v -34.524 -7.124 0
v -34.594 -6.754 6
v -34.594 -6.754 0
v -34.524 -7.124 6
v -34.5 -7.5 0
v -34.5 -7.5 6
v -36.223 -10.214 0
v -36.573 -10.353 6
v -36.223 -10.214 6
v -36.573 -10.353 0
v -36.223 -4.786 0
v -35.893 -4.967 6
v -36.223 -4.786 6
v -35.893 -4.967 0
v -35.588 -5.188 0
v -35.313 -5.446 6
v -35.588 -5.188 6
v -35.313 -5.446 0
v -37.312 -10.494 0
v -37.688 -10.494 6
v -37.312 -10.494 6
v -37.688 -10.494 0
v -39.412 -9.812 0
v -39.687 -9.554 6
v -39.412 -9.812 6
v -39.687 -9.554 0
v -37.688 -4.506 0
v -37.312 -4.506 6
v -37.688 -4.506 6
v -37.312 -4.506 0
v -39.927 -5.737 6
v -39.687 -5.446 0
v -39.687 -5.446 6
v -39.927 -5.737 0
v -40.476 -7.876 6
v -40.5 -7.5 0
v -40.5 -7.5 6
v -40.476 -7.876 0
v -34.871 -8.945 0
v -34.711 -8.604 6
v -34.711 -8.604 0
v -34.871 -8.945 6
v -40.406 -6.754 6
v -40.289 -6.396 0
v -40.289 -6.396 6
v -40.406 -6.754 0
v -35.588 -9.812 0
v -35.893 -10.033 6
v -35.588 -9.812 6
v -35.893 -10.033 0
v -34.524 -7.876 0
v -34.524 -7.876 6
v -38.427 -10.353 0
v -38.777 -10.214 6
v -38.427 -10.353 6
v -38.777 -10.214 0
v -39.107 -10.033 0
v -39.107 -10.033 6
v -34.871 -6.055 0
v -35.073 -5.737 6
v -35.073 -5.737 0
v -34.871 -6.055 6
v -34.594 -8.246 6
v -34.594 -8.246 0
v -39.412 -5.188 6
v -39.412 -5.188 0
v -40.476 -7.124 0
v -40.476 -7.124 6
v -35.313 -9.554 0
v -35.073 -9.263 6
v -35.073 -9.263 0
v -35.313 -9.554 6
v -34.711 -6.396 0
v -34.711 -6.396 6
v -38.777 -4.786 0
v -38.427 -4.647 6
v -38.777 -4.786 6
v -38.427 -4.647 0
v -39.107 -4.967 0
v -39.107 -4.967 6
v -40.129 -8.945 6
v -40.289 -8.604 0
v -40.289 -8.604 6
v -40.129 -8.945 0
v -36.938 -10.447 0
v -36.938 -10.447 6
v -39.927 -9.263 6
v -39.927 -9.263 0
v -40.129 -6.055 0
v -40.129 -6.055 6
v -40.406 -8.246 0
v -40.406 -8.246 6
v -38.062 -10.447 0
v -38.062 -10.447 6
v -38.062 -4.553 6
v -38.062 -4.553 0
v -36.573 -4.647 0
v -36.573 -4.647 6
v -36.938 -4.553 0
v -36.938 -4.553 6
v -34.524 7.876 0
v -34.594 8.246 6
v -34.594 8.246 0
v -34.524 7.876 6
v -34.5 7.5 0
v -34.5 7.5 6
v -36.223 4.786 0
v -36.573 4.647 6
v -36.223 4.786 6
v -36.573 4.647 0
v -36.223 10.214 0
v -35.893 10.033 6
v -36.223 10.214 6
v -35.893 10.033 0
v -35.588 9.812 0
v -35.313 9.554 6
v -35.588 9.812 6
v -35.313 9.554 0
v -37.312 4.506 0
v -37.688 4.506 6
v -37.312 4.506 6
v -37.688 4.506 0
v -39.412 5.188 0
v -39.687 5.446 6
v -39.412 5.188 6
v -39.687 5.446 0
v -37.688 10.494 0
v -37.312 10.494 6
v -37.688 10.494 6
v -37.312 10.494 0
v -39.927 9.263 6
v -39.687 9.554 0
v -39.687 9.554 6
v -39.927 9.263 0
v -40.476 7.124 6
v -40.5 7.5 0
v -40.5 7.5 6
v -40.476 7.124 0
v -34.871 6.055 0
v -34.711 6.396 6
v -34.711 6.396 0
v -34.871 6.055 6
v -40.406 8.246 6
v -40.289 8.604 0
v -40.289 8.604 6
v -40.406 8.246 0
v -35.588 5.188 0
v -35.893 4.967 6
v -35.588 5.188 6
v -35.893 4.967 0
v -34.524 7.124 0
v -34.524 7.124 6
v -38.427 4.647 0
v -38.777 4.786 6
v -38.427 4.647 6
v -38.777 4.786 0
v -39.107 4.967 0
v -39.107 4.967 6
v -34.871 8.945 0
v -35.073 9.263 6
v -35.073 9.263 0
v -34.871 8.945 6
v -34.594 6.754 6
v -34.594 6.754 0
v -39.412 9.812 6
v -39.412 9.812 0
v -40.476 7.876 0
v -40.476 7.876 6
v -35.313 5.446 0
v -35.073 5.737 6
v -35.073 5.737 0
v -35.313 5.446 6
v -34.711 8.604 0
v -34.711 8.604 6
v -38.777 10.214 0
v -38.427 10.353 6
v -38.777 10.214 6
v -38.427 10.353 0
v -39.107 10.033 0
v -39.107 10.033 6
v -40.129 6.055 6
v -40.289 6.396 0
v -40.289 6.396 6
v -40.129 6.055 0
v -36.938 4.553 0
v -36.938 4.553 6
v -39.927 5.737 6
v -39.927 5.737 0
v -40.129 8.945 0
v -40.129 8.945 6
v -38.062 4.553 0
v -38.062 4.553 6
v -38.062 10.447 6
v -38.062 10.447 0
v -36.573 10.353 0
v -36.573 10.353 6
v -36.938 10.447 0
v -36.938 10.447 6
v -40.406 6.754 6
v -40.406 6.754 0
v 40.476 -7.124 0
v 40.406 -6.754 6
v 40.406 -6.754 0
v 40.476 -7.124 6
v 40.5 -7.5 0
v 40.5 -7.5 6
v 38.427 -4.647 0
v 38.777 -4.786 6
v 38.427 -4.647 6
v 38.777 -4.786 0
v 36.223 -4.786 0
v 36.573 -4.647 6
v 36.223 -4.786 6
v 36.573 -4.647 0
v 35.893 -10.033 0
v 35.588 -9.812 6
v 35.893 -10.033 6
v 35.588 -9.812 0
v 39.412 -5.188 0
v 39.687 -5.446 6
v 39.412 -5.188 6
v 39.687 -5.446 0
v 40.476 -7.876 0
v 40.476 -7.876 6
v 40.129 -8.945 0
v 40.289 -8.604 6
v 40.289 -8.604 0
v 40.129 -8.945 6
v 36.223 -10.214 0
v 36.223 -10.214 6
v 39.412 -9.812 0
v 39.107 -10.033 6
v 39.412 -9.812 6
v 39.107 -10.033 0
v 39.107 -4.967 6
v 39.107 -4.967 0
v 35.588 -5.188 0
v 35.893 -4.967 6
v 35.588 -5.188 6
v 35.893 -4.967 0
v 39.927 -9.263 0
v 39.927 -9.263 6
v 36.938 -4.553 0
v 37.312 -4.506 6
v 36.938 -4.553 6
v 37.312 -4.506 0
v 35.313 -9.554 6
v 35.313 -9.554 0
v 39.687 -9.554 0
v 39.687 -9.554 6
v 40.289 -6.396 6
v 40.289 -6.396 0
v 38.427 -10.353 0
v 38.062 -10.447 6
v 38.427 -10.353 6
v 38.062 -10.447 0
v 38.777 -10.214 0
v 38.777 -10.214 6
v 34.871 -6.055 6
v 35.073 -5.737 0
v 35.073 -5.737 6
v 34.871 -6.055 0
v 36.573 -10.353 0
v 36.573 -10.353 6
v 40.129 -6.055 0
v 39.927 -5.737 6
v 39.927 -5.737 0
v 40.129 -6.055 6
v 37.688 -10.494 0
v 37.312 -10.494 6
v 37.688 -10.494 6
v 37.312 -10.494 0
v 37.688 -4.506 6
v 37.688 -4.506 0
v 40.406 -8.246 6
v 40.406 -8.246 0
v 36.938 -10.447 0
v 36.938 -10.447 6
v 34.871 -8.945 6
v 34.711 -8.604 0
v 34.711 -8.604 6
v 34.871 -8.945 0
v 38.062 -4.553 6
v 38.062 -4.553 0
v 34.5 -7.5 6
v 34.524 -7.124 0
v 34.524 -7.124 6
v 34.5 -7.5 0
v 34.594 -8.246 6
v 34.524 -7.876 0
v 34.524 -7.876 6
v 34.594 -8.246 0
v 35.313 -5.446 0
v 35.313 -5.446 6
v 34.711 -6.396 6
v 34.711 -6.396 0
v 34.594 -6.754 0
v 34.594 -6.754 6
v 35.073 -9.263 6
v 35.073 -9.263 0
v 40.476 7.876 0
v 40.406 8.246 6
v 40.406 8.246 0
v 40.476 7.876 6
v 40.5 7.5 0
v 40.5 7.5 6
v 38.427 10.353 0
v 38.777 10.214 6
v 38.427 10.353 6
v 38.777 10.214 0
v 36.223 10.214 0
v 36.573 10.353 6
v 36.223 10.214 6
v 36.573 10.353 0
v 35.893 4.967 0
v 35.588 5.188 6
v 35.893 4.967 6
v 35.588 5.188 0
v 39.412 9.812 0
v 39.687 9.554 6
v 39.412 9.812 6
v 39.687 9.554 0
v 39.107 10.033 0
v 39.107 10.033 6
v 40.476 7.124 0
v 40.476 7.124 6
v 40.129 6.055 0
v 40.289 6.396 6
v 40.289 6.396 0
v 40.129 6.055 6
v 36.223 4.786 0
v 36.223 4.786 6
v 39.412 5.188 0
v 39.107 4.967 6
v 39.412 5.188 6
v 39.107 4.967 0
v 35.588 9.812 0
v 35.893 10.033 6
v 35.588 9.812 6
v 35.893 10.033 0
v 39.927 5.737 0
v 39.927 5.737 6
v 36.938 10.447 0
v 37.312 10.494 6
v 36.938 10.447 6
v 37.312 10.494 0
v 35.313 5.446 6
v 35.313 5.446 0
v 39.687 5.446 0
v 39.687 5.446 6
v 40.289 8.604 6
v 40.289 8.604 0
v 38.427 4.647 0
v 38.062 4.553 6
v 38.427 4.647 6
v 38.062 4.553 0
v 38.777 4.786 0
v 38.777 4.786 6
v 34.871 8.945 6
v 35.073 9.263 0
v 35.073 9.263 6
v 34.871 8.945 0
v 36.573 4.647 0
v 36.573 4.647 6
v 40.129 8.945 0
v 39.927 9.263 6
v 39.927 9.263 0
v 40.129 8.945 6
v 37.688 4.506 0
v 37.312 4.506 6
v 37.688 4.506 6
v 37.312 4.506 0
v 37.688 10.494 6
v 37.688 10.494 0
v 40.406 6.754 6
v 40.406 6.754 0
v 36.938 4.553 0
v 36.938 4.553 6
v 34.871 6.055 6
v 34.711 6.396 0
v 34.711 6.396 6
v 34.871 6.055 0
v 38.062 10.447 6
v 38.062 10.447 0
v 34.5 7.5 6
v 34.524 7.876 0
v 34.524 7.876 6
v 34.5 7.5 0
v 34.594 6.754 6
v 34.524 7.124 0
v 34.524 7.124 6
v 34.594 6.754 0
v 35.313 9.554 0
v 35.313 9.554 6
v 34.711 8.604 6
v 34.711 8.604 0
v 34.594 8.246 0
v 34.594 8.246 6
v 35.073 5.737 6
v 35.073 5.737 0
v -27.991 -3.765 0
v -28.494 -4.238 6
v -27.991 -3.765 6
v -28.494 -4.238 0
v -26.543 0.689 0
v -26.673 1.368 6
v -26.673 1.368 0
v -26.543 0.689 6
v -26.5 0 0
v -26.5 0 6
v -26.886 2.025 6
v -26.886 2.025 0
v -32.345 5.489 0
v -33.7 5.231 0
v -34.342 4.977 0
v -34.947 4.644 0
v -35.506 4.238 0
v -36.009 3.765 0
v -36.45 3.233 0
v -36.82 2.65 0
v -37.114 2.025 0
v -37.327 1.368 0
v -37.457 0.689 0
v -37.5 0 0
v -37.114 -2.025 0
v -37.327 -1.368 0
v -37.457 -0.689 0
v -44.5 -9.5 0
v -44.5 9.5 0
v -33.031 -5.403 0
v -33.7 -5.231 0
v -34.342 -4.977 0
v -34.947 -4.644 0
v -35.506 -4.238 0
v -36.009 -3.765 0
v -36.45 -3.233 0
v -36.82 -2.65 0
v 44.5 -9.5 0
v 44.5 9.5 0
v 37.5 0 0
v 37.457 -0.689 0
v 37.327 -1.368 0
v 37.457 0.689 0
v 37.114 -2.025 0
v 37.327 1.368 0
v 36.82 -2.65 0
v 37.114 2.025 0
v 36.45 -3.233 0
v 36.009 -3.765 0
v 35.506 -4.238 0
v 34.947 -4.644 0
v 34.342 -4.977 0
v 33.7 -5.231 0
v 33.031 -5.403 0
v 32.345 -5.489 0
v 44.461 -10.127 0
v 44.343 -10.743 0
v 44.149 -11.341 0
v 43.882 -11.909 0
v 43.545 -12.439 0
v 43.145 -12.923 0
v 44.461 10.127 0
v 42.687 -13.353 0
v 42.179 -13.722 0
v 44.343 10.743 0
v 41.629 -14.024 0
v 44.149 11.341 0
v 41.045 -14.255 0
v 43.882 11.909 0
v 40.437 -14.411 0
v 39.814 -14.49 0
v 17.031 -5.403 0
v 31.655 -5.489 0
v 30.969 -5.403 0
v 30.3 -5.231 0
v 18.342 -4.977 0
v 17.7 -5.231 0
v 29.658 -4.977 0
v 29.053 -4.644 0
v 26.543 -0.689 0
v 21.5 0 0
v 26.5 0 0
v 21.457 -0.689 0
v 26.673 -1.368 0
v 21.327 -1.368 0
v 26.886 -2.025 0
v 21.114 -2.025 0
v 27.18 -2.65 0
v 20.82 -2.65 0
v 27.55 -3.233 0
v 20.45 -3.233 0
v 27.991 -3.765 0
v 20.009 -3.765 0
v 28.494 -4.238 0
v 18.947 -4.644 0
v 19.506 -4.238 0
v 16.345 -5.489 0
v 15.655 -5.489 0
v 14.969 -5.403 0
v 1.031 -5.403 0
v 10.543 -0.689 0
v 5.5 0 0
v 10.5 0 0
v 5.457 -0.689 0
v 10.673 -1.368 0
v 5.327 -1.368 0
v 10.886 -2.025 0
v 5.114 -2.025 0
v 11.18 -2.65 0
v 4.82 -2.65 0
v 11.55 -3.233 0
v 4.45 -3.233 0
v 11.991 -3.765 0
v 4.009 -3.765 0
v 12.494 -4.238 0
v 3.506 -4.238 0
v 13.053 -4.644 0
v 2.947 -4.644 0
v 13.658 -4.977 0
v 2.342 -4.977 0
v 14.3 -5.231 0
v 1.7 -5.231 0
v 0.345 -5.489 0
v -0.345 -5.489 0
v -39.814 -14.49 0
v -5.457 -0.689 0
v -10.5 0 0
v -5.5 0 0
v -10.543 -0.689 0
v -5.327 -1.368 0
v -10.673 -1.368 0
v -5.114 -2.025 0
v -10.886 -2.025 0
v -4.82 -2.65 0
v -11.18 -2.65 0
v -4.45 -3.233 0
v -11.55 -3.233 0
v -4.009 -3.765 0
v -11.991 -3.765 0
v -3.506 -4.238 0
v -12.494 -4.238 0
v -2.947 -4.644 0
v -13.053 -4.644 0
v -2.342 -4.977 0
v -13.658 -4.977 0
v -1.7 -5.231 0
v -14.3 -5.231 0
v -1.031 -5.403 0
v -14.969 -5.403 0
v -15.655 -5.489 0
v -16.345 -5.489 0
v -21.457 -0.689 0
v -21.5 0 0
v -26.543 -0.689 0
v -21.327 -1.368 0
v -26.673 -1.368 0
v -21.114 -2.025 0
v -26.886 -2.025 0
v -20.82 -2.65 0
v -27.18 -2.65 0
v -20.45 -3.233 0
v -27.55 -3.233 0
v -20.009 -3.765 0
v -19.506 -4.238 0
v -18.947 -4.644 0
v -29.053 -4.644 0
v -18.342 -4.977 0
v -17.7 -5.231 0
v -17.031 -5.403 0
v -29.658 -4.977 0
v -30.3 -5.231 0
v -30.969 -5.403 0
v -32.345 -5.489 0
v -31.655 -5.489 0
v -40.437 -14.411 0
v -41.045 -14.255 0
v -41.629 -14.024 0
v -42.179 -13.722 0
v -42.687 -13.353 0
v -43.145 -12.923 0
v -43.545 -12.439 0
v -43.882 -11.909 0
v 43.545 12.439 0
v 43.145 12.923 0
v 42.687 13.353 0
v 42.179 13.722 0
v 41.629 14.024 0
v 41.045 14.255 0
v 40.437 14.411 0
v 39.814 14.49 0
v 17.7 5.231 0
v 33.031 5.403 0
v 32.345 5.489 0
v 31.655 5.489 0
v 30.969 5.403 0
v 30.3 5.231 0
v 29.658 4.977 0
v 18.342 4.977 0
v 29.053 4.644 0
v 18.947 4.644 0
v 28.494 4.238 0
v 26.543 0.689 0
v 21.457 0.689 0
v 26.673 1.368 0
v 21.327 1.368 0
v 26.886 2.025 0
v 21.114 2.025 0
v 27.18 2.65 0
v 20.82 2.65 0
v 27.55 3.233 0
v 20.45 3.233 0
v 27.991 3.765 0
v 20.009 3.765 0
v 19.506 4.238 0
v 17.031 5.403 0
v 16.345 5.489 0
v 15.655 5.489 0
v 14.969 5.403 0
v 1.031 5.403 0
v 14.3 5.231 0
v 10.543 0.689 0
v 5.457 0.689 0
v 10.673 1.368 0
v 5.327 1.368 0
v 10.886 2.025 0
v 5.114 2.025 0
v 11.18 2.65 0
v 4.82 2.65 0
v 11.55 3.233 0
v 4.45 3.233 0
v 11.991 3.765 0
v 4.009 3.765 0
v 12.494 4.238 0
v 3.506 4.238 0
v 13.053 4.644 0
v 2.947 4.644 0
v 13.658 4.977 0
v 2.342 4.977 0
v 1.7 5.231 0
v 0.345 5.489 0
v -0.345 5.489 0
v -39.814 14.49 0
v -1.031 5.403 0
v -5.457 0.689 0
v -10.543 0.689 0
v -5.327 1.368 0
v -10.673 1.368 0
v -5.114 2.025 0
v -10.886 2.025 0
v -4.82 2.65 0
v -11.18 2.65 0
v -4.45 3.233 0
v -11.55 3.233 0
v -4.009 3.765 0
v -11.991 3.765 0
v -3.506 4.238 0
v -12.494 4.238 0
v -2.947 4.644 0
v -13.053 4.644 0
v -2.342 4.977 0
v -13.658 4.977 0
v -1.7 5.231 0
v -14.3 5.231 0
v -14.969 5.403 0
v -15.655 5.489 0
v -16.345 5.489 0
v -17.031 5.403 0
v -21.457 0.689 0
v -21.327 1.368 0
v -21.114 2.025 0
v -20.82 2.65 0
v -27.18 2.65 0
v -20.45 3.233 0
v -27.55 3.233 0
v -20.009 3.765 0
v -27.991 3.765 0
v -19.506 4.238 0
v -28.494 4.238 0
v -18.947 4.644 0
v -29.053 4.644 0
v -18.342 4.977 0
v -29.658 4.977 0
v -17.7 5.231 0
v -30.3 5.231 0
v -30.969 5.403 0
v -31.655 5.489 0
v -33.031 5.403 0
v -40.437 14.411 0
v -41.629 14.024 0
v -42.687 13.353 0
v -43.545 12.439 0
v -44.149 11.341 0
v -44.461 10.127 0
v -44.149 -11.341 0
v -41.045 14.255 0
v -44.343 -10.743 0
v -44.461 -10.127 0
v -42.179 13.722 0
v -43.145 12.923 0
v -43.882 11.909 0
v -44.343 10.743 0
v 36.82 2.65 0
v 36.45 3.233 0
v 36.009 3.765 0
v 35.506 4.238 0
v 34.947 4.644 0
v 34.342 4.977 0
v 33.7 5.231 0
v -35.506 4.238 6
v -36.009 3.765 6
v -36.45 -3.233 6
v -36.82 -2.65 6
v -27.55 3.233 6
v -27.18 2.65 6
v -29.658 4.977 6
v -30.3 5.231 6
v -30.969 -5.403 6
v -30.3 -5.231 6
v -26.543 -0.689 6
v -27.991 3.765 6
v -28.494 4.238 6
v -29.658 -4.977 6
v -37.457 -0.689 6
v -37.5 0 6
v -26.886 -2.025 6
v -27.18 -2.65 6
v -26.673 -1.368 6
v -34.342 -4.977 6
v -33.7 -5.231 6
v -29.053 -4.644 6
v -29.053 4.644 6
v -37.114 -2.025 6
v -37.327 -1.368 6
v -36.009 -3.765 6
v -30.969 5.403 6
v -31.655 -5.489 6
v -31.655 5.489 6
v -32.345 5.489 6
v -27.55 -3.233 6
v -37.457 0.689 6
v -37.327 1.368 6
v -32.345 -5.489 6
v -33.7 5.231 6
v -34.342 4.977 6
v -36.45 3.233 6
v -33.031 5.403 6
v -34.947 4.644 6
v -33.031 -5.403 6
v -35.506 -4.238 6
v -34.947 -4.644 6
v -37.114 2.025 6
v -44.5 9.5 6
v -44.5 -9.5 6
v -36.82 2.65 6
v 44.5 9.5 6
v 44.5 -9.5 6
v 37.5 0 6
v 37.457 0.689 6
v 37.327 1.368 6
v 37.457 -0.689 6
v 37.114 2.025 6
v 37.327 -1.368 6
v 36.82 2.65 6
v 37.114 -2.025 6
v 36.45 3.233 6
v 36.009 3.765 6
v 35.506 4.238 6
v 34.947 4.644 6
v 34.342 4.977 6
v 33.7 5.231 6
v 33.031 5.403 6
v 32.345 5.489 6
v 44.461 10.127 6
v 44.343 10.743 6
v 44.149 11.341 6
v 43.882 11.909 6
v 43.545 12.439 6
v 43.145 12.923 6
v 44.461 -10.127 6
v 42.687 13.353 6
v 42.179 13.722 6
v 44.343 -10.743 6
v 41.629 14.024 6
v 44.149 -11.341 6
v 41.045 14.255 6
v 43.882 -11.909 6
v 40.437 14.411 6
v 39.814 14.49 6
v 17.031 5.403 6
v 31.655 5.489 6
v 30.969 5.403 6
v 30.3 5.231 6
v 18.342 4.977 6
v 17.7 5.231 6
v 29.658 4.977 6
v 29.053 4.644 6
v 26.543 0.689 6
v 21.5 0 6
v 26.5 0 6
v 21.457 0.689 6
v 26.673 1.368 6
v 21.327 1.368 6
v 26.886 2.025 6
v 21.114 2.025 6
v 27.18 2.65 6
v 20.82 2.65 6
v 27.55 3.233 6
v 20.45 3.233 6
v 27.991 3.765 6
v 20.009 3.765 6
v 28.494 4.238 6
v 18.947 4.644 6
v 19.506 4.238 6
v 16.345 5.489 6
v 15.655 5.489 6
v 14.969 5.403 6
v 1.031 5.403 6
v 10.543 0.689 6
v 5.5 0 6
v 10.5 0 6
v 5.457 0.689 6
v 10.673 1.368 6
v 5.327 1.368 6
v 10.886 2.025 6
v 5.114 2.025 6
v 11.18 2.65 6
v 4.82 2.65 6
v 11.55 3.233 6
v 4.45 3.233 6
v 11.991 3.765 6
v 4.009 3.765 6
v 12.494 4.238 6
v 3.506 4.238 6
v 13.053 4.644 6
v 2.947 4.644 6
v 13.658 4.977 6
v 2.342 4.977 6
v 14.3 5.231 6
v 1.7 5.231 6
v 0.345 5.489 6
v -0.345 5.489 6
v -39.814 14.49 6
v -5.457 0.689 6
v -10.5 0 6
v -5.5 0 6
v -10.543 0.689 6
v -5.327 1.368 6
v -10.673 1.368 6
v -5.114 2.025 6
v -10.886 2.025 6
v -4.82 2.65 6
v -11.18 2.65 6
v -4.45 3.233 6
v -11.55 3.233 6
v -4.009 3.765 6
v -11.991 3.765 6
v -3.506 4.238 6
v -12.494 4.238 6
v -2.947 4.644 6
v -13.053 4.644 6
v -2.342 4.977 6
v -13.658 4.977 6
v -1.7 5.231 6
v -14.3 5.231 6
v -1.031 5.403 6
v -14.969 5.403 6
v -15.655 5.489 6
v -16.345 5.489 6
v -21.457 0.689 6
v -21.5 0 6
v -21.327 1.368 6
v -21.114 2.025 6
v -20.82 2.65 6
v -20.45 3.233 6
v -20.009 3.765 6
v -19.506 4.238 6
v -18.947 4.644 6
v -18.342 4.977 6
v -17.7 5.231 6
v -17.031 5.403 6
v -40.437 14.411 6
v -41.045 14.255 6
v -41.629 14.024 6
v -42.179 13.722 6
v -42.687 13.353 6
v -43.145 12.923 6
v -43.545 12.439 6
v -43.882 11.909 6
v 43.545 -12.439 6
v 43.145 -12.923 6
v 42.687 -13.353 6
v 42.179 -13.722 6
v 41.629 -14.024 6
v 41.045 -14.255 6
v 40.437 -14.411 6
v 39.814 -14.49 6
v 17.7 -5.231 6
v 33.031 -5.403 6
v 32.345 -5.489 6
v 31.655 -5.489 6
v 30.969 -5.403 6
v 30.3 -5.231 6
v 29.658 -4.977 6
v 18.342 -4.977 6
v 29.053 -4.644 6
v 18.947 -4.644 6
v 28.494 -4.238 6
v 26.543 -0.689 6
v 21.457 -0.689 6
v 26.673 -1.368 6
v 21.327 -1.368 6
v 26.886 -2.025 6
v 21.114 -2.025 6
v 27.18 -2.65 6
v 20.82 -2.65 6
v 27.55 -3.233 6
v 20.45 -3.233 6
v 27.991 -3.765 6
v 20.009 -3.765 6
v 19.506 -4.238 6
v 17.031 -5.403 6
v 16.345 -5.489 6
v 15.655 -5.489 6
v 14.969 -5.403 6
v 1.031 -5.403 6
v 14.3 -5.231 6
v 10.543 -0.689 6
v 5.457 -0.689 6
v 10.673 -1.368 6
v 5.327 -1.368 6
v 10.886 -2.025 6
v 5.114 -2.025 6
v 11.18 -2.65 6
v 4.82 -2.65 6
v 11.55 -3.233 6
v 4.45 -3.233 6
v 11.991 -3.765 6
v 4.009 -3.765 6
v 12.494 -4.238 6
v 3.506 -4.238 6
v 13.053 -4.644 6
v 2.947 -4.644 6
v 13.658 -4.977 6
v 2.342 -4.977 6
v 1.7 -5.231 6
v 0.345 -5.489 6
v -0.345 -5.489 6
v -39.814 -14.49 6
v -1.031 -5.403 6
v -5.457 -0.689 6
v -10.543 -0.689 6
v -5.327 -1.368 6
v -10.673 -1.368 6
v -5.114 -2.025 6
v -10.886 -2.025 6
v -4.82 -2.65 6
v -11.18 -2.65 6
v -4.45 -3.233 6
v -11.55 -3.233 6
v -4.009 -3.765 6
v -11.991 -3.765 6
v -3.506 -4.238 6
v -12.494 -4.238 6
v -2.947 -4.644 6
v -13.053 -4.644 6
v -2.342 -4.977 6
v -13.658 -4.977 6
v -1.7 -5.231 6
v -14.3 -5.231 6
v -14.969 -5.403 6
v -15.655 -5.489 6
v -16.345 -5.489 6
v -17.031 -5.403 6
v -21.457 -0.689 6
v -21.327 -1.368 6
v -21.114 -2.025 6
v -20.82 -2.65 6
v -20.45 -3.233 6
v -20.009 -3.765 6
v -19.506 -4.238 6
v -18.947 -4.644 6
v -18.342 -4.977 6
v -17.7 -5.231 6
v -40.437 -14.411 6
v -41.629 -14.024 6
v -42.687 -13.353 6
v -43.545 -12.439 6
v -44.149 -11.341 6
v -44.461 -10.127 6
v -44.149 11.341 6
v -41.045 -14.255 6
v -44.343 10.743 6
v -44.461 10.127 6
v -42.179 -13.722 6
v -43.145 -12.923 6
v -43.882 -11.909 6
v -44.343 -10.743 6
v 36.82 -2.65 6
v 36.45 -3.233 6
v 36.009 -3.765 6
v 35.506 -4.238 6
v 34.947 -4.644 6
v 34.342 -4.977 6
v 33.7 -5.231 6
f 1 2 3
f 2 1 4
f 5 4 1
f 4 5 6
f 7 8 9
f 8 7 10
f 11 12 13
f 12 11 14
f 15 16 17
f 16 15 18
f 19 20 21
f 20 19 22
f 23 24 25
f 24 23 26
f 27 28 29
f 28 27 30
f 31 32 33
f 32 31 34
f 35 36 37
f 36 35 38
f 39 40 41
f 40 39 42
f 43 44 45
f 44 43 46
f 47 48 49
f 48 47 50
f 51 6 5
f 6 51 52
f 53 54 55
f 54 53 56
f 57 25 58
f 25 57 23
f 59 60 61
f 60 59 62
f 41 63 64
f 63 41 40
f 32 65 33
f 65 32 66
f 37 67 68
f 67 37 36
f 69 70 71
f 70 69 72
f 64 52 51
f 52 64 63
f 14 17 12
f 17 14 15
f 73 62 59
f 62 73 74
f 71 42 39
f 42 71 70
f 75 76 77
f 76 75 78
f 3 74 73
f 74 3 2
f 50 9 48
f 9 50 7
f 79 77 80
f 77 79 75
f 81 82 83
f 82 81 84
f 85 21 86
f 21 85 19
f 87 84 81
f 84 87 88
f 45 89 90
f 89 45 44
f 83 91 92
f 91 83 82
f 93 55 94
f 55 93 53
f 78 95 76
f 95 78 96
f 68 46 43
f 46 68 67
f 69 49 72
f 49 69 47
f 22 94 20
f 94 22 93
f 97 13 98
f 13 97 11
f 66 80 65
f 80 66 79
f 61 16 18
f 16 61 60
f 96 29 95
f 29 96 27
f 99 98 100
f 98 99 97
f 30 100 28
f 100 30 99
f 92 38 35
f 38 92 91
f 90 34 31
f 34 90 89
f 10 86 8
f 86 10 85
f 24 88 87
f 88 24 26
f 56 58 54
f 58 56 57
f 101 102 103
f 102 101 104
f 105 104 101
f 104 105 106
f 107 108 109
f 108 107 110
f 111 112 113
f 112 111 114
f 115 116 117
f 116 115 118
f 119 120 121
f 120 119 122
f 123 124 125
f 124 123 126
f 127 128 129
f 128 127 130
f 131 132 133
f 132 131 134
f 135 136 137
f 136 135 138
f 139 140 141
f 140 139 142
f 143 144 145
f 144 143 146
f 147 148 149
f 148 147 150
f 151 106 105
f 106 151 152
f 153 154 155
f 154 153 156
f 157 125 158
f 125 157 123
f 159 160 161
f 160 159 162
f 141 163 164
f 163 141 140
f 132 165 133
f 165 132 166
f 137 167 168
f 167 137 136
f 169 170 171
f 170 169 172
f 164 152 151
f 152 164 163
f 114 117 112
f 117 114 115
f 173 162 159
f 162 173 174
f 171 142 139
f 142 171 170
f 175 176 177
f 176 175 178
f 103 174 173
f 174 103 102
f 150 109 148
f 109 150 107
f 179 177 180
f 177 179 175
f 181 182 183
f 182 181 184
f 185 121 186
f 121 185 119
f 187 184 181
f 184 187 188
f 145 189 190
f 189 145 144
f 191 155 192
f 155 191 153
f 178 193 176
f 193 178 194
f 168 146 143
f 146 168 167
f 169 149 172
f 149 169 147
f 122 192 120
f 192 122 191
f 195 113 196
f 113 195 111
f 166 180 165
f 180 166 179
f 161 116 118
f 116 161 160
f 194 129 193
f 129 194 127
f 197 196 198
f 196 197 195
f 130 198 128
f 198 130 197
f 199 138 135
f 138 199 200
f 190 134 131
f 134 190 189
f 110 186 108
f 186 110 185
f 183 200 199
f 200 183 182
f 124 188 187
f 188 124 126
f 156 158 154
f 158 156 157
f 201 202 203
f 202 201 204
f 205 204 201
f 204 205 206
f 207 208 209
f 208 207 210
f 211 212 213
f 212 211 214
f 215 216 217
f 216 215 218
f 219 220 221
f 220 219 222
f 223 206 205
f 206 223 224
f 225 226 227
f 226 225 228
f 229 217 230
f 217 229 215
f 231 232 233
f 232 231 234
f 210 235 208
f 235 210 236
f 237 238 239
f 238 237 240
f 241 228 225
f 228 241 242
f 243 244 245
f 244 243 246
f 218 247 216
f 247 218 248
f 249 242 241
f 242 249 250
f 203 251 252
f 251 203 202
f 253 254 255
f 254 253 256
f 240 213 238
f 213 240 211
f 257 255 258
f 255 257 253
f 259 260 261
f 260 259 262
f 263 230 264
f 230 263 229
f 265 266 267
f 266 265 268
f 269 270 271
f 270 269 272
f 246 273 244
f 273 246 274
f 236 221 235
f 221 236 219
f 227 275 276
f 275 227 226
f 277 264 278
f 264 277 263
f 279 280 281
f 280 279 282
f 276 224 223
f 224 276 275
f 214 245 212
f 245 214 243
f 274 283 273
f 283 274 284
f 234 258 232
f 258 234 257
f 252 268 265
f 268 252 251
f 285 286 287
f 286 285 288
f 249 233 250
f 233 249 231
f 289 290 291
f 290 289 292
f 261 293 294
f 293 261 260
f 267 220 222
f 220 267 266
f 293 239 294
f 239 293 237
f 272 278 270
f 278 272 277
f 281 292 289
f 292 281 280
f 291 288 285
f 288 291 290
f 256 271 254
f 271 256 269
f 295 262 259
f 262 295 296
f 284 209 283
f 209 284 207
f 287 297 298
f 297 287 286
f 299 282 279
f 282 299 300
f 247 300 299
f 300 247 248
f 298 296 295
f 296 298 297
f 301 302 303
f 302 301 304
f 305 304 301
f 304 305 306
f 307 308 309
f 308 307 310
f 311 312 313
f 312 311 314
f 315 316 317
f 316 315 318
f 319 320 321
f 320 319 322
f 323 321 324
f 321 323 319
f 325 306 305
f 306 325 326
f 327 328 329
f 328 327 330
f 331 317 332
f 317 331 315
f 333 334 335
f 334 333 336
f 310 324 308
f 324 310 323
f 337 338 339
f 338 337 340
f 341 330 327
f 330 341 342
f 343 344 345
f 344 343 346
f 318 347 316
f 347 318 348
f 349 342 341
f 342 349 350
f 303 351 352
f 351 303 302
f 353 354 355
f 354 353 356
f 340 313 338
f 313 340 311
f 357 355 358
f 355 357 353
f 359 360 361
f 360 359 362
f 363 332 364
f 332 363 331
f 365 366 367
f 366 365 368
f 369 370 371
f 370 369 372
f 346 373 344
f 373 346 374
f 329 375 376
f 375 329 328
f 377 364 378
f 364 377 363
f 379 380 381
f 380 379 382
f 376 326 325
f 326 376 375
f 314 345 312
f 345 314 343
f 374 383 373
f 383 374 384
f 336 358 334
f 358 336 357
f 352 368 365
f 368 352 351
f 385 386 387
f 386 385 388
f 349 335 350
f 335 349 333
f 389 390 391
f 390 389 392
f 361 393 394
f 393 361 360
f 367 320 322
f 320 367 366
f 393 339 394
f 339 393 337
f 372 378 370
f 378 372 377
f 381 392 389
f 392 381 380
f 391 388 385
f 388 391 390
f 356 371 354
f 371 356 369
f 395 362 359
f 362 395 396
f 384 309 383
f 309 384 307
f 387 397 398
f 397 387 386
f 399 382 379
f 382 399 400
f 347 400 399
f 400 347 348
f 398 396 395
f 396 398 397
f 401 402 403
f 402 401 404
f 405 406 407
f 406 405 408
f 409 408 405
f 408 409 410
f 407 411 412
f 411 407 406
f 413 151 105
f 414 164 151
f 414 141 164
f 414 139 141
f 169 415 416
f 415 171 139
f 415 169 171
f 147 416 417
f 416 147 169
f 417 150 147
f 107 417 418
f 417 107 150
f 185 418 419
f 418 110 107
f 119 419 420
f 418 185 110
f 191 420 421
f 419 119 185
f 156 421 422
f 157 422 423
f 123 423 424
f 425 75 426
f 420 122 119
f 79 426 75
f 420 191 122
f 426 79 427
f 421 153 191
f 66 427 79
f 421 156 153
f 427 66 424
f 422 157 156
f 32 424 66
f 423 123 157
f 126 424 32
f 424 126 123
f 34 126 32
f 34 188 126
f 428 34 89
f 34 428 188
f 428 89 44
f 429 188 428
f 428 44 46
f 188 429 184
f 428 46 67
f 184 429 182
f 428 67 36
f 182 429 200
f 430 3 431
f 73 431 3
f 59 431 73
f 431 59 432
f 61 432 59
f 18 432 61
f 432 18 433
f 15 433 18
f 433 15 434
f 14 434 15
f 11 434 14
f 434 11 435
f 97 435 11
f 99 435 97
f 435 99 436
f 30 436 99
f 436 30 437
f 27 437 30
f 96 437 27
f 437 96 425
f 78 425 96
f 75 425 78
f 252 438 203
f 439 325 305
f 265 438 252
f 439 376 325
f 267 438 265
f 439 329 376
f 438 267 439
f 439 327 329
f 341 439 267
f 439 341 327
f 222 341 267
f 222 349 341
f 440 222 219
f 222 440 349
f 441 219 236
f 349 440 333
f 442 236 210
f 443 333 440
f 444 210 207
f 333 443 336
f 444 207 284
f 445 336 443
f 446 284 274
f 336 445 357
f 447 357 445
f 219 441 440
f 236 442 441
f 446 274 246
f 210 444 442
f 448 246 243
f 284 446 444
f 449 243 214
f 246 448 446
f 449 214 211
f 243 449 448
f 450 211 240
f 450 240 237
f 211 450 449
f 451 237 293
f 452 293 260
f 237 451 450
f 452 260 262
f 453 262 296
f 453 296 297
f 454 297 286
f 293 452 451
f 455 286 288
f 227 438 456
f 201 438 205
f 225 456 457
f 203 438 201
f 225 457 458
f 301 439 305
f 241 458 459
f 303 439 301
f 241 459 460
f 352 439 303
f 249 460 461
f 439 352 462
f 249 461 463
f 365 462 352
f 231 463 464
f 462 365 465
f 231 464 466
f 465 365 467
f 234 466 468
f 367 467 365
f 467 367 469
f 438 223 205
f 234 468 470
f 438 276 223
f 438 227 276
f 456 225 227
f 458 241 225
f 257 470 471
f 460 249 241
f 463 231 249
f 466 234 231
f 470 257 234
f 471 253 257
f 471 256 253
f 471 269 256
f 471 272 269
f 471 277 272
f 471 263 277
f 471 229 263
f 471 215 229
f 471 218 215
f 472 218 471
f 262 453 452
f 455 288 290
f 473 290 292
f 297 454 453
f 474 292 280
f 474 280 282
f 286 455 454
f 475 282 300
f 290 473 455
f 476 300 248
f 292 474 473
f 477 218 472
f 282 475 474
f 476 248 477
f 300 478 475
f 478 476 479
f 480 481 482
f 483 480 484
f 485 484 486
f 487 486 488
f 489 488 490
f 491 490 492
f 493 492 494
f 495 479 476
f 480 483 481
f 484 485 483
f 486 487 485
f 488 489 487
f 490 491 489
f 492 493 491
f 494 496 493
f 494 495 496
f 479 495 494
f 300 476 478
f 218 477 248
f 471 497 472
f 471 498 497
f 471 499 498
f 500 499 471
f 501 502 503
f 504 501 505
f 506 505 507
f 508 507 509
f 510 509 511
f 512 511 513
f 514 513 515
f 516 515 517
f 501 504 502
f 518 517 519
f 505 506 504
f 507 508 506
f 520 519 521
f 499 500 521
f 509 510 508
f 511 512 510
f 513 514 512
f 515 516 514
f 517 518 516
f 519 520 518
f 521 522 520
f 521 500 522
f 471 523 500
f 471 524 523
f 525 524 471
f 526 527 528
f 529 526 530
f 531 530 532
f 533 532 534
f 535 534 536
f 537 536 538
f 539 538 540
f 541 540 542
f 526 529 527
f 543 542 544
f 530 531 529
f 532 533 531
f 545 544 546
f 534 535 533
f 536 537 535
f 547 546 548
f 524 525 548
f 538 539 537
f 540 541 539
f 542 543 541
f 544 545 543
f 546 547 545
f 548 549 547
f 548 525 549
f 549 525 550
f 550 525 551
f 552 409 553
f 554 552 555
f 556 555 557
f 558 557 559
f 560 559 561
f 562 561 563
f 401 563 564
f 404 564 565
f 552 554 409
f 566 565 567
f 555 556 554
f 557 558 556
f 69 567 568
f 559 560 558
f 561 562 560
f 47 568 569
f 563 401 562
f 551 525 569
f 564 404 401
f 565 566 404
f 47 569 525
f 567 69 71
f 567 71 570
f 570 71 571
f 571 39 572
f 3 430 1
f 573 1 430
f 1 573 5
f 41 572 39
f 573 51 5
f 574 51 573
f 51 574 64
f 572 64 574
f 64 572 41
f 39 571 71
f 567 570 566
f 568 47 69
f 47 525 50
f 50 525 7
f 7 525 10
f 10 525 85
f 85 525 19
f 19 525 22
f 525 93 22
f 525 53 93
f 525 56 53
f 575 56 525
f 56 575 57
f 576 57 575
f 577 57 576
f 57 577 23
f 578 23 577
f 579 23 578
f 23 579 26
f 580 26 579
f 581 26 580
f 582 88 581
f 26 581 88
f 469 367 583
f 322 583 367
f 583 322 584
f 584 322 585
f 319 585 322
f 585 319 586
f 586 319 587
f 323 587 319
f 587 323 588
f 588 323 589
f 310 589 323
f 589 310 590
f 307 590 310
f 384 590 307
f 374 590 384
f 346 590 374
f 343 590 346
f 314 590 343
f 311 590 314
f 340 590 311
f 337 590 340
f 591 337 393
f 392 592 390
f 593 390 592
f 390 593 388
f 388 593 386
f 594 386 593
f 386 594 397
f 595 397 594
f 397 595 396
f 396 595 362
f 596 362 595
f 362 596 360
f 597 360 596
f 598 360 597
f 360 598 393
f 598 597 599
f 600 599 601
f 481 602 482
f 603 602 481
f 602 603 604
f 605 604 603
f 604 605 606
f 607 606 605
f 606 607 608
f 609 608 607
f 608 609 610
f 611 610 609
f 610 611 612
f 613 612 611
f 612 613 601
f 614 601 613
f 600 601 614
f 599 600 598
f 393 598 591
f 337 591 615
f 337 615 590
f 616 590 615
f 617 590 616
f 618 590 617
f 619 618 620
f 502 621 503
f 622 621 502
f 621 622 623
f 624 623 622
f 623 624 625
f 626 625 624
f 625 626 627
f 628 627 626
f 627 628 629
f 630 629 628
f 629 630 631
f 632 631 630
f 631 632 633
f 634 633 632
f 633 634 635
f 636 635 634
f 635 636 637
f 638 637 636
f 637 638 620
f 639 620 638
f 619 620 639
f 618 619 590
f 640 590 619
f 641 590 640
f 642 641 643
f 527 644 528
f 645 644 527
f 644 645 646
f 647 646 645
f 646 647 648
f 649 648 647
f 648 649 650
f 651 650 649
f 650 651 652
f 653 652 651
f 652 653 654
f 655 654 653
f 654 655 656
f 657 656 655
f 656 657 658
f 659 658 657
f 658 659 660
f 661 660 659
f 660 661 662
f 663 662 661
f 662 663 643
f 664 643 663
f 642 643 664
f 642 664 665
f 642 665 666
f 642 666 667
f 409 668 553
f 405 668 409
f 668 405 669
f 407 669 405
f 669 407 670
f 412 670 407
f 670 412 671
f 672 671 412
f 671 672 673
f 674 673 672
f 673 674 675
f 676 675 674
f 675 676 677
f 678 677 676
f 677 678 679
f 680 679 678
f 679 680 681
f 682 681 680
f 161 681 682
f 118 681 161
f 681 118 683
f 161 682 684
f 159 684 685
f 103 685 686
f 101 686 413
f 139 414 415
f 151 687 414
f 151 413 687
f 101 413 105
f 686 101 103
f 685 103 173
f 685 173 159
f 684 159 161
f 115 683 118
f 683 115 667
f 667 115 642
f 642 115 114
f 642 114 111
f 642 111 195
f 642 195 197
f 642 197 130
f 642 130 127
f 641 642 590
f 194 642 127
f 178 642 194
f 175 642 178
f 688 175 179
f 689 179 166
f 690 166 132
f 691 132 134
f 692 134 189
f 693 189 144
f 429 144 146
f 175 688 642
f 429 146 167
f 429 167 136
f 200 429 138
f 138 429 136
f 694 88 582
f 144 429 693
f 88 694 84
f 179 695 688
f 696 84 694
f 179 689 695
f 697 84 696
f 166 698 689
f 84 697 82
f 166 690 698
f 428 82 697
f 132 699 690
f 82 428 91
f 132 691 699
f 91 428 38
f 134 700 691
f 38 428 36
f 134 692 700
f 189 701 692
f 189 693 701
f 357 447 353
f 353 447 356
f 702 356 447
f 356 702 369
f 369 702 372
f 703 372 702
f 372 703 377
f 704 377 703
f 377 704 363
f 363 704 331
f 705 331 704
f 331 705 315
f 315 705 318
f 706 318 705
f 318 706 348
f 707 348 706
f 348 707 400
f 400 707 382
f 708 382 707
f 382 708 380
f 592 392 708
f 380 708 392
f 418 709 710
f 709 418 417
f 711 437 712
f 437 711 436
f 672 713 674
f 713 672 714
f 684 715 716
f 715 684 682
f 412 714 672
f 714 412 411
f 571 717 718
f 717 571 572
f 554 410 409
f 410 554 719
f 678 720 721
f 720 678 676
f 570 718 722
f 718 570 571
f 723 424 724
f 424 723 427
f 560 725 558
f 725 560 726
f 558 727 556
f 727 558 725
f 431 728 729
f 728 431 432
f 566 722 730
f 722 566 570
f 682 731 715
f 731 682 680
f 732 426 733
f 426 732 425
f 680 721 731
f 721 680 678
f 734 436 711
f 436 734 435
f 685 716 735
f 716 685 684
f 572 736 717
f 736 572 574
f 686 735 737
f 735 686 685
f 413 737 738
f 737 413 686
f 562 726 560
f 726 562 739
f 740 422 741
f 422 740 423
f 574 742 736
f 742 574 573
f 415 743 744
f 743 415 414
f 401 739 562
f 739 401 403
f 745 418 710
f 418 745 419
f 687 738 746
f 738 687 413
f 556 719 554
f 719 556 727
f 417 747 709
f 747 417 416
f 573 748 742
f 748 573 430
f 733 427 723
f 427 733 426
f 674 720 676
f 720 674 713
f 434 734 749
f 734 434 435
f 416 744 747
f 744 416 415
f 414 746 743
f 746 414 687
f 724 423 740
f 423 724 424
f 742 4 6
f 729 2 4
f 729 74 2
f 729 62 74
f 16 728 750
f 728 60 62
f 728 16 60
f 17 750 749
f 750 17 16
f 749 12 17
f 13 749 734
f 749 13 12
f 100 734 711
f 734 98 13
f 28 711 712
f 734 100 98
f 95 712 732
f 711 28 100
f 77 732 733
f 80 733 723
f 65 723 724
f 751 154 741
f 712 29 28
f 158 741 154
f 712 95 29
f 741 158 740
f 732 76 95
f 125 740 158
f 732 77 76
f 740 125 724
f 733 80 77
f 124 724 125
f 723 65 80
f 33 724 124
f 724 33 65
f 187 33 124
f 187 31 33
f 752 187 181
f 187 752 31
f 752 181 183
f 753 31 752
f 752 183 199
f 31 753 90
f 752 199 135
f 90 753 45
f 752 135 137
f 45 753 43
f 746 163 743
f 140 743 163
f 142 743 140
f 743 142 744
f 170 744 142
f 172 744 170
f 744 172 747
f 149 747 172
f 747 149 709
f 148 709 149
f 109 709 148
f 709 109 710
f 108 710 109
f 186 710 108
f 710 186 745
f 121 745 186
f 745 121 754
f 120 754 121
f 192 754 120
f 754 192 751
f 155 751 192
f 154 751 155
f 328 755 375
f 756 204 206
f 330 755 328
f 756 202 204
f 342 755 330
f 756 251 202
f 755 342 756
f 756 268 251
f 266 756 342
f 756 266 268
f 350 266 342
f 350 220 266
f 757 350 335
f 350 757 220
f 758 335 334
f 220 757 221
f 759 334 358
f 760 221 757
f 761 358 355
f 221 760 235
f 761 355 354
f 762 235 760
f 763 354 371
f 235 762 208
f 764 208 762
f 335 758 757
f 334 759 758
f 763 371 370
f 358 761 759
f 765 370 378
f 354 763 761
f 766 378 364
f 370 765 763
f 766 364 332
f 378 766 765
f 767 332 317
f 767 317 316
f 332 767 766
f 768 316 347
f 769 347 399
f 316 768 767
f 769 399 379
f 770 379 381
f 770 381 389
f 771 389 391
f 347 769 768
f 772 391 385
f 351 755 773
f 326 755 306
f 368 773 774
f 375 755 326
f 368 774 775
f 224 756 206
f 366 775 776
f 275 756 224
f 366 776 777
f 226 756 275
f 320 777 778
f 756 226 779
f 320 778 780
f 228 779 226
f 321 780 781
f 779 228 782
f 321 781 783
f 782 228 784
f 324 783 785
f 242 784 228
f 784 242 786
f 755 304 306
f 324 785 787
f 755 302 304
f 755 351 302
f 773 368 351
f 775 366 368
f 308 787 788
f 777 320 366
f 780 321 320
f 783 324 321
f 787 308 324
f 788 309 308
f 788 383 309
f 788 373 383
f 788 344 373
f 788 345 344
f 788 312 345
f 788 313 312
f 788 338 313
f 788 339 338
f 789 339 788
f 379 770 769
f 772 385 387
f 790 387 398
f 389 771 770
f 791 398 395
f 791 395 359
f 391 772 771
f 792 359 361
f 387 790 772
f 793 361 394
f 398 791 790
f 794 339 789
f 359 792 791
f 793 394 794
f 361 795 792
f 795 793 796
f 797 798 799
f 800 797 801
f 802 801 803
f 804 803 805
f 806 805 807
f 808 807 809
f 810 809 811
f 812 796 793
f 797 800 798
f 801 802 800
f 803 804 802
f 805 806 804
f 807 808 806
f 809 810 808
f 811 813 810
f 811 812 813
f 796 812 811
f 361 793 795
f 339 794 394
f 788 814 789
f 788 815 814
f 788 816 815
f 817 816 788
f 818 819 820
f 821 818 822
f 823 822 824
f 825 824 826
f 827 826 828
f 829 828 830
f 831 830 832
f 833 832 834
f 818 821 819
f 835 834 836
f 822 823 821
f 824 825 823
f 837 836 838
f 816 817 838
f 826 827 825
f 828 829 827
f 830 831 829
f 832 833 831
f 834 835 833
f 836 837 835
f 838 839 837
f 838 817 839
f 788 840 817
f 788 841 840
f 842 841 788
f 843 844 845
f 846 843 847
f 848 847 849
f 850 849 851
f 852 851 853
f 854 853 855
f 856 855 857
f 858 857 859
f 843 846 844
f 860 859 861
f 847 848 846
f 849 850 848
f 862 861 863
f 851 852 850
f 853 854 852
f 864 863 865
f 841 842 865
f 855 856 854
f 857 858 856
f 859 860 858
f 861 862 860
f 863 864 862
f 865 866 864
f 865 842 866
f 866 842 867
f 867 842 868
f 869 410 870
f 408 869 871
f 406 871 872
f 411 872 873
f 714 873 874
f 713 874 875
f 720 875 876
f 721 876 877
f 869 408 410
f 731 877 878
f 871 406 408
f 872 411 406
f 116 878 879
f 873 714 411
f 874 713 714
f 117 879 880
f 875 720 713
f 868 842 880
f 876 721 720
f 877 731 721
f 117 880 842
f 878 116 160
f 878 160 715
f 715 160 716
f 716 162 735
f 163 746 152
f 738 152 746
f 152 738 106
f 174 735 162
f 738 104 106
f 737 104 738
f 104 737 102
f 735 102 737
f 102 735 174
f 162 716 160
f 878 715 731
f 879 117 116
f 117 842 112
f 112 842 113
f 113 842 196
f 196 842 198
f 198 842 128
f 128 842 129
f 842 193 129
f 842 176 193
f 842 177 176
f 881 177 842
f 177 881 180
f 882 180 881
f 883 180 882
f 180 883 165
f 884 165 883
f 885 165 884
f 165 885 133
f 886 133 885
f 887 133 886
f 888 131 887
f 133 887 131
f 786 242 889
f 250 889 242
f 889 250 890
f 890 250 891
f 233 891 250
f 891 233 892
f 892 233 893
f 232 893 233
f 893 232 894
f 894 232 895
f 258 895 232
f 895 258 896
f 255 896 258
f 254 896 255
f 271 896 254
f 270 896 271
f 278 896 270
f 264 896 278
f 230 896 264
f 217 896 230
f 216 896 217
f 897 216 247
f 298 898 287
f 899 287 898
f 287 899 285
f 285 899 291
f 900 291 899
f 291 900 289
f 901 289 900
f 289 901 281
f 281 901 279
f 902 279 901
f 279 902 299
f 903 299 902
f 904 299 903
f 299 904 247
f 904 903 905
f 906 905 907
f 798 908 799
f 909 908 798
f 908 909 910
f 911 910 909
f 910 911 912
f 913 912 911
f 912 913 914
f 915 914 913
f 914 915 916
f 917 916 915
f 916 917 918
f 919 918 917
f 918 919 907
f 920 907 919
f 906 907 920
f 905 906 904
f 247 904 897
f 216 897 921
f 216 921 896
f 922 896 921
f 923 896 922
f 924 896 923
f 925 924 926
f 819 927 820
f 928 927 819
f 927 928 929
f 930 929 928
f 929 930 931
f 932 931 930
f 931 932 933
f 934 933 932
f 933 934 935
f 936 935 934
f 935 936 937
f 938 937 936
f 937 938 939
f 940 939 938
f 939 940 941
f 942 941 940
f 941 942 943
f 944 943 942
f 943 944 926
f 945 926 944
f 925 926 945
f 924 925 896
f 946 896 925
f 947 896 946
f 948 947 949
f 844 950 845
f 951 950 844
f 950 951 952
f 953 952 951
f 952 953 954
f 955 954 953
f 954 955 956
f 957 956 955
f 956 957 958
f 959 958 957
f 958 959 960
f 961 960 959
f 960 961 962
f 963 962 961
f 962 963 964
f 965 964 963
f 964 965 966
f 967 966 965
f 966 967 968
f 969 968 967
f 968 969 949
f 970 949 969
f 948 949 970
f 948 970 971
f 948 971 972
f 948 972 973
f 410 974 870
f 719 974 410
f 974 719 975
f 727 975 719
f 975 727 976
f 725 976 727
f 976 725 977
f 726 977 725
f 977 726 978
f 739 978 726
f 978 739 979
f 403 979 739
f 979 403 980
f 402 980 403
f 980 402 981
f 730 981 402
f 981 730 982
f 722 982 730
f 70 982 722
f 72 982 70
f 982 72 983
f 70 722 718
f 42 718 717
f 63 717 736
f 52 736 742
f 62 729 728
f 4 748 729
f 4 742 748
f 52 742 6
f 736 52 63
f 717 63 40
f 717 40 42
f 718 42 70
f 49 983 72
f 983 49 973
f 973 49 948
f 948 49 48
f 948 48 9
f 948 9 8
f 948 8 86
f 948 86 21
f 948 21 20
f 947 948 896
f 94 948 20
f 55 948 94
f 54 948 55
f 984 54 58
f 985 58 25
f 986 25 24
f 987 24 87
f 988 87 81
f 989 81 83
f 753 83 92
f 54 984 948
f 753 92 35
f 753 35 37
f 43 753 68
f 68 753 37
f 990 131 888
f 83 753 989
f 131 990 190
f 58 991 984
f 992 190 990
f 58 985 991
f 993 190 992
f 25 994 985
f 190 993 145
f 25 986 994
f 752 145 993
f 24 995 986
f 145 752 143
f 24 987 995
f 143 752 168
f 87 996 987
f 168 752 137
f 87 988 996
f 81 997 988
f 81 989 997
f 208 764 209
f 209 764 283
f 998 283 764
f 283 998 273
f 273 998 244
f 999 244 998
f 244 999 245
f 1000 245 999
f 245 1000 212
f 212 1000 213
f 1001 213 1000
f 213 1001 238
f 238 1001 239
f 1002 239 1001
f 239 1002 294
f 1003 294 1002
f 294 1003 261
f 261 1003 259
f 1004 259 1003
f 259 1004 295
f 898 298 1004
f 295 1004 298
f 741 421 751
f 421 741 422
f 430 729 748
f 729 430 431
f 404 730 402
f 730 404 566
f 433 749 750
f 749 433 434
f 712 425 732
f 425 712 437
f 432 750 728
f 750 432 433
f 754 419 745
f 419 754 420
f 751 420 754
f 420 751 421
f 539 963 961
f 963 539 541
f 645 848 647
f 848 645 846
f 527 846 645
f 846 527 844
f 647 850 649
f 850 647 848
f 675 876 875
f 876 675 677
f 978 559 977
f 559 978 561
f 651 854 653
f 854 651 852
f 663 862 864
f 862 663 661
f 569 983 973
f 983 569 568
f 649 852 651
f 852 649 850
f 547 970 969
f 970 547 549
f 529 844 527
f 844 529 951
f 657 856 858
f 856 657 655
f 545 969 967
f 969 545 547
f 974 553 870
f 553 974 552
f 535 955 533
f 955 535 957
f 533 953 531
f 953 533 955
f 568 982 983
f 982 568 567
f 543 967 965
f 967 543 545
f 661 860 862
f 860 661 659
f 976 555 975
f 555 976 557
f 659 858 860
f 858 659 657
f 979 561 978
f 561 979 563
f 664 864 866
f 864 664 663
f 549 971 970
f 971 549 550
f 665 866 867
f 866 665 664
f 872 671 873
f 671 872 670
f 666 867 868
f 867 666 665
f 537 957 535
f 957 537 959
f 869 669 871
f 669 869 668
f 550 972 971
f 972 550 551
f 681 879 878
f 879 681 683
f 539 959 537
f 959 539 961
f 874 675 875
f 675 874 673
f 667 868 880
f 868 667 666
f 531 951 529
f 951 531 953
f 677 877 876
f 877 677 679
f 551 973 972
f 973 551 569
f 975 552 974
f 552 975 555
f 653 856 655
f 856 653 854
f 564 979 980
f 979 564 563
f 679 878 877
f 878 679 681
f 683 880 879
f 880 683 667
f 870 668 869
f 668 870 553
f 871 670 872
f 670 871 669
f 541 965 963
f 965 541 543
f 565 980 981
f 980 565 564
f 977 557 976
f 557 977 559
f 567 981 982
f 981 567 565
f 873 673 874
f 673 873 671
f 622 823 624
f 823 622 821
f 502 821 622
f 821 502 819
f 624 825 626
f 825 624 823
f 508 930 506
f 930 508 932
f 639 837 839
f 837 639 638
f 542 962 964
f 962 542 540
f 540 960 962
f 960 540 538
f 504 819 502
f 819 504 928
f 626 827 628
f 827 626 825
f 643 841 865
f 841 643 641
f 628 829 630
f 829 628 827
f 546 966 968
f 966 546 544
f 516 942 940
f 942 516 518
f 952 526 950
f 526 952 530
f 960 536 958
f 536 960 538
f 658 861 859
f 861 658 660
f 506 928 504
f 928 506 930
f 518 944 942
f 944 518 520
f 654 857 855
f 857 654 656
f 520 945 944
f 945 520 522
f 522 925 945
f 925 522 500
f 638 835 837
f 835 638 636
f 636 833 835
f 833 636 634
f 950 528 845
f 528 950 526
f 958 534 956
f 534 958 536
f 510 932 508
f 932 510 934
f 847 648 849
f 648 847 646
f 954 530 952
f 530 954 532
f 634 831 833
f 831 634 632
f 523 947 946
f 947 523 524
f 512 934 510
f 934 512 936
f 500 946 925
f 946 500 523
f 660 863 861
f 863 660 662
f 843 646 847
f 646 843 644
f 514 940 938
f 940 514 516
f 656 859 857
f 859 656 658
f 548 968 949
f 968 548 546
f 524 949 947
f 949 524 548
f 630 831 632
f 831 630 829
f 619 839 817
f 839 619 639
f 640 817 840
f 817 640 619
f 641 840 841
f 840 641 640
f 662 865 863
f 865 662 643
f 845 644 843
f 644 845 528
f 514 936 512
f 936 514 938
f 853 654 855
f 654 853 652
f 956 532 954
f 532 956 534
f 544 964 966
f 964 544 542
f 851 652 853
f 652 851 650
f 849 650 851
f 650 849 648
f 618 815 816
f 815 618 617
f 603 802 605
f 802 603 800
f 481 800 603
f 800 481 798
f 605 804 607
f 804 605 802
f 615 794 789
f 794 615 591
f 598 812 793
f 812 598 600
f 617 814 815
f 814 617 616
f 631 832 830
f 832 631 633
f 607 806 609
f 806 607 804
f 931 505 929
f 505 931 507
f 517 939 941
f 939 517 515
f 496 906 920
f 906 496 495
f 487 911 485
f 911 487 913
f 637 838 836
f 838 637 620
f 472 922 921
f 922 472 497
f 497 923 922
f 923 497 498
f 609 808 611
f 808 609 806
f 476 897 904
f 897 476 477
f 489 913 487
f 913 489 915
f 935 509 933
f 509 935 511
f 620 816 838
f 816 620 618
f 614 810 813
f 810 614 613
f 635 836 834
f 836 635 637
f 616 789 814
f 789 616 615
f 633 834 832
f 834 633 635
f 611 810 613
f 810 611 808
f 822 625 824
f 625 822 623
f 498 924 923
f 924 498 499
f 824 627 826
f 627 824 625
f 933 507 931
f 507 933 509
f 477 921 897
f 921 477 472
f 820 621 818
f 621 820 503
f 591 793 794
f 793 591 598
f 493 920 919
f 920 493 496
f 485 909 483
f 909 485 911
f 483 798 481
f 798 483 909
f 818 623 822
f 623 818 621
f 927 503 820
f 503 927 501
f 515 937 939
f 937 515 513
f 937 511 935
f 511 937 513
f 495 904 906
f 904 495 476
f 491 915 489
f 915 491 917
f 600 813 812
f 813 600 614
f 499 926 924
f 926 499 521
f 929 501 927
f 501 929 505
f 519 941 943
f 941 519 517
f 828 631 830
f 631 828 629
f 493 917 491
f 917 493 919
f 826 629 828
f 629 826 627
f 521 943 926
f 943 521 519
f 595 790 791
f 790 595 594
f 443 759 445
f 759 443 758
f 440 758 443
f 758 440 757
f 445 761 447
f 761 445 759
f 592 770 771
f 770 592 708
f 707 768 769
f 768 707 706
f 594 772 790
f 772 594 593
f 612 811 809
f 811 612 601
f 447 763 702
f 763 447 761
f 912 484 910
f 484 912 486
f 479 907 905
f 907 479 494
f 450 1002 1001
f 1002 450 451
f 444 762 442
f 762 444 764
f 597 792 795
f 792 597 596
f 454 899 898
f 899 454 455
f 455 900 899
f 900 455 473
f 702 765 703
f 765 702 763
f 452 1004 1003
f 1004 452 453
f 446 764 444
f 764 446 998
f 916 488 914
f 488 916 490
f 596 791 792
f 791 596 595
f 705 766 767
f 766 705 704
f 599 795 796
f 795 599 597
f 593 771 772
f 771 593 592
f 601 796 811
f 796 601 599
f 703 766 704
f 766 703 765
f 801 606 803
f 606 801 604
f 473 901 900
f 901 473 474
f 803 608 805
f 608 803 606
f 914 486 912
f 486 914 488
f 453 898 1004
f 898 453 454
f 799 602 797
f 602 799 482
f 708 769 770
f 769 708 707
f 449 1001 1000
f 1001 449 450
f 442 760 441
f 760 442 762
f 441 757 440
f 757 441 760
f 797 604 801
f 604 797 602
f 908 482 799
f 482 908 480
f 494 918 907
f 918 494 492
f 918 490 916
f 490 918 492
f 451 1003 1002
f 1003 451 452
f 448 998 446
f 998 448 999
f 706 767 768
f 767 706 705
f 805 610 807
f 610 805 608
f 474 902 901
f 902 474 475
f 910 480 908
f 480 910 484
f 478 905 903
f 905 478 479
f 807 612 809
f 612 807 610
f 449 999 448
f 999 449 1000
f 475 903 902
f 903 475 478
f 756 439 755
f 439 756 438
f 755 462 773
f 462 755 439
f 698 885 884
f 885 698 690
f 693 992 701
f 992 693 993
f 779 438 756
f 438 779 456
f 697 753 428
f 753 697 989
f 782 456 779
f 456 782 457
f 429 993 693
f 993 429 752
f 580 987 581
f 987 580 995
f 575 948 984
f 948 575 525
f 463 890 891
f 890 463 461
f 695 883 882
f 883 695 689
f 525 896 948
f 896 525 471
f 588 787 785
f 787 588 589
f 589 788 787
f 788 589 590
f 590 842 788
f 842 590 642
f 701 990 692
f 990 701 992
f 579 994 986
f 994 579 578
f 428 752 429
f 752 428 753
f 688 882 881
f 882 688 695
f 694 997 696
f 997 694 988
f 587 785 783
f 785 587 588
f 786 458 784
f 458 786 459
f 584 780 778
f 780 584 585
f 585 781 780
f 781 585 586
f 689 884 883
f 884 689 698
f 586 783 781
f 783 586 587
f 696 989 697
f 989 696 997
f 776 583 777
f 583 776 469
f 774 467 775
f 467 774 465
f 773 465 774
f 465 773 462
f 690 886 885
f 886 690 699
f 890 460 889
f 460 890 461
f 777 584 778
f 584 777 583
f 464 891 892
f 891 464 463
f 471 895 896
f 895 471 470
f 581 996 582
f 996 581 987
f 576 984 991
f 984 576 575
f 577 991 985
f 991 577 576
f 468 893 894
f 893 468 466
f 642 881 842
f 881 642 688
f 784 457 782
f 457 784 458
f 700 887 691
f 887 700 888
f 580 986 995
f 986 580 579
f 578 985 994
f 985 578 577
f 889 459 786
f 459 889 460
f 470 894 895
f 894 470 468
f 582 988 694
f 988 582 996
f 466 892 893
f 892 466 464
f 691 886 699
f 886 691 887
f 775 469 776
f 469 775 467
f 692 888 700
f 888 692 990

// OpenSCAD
$fn = 50;


difference() {
	union() {
		hull() {
			translate(v = [-39.5000000000, 9.5000000000, 0]) {
				cylinder(h = 6, r = 5);
			}
			translate(v = [39.5000000000, 9.5000000000, 0]) {
				cylinder(h = 6, r = 5);
			}
			translate(v = [-39.5000000000, -9.5000000000, 0]) {
				cylinder(h = 6, r = 5);
			}
			translate(v = [39.5000000000, -9.5000000000, 0]) {
				cylinder(h = 6, r = 5);
			}
		}
	}
	union() {
		#translate(v = [-37.5000000000, -7.5000000000, -100.0000000000]) {
			cylinder(h = 200, r = 3.0000000000);
		}
		#translate(v = [-37.5000000000, 7.5000000000, -100.0000000000]) {
			cylinder(h = 200, r = 3.0000000000);
		}
		#translate(v = [37.5000000000, -7.5000000000, -100.0000000000]) {
			cylinder(h = 200, r = 3.0000000000);
		}
		#translate(v = [37.5000000000, 7.5000000000, -100.0000000000]) {
			cylinder(h = 200, r = 3.0000000000);
		}
		#translate(v = [-32.0000000000, 0, 0]) {
			cylinder(h = 6, r = 5.5000000000);
		}
		#translate(v = [-16.0000000000, 0, 0]) {
			cylinder(h = 6, r = 5.5000000000);
		}
		#cylinder(h = 6, r = 5.5000000000);
		#translate(v = [16.0000000000, 0, 0]) {
			cylinder(h = 6, r = 5.5000000000);
		}
		#translate(v = [32.0000000000, 0, 0]) {
			cylinder(h = 6, r = 5.5000000000);
		}
	}
}
